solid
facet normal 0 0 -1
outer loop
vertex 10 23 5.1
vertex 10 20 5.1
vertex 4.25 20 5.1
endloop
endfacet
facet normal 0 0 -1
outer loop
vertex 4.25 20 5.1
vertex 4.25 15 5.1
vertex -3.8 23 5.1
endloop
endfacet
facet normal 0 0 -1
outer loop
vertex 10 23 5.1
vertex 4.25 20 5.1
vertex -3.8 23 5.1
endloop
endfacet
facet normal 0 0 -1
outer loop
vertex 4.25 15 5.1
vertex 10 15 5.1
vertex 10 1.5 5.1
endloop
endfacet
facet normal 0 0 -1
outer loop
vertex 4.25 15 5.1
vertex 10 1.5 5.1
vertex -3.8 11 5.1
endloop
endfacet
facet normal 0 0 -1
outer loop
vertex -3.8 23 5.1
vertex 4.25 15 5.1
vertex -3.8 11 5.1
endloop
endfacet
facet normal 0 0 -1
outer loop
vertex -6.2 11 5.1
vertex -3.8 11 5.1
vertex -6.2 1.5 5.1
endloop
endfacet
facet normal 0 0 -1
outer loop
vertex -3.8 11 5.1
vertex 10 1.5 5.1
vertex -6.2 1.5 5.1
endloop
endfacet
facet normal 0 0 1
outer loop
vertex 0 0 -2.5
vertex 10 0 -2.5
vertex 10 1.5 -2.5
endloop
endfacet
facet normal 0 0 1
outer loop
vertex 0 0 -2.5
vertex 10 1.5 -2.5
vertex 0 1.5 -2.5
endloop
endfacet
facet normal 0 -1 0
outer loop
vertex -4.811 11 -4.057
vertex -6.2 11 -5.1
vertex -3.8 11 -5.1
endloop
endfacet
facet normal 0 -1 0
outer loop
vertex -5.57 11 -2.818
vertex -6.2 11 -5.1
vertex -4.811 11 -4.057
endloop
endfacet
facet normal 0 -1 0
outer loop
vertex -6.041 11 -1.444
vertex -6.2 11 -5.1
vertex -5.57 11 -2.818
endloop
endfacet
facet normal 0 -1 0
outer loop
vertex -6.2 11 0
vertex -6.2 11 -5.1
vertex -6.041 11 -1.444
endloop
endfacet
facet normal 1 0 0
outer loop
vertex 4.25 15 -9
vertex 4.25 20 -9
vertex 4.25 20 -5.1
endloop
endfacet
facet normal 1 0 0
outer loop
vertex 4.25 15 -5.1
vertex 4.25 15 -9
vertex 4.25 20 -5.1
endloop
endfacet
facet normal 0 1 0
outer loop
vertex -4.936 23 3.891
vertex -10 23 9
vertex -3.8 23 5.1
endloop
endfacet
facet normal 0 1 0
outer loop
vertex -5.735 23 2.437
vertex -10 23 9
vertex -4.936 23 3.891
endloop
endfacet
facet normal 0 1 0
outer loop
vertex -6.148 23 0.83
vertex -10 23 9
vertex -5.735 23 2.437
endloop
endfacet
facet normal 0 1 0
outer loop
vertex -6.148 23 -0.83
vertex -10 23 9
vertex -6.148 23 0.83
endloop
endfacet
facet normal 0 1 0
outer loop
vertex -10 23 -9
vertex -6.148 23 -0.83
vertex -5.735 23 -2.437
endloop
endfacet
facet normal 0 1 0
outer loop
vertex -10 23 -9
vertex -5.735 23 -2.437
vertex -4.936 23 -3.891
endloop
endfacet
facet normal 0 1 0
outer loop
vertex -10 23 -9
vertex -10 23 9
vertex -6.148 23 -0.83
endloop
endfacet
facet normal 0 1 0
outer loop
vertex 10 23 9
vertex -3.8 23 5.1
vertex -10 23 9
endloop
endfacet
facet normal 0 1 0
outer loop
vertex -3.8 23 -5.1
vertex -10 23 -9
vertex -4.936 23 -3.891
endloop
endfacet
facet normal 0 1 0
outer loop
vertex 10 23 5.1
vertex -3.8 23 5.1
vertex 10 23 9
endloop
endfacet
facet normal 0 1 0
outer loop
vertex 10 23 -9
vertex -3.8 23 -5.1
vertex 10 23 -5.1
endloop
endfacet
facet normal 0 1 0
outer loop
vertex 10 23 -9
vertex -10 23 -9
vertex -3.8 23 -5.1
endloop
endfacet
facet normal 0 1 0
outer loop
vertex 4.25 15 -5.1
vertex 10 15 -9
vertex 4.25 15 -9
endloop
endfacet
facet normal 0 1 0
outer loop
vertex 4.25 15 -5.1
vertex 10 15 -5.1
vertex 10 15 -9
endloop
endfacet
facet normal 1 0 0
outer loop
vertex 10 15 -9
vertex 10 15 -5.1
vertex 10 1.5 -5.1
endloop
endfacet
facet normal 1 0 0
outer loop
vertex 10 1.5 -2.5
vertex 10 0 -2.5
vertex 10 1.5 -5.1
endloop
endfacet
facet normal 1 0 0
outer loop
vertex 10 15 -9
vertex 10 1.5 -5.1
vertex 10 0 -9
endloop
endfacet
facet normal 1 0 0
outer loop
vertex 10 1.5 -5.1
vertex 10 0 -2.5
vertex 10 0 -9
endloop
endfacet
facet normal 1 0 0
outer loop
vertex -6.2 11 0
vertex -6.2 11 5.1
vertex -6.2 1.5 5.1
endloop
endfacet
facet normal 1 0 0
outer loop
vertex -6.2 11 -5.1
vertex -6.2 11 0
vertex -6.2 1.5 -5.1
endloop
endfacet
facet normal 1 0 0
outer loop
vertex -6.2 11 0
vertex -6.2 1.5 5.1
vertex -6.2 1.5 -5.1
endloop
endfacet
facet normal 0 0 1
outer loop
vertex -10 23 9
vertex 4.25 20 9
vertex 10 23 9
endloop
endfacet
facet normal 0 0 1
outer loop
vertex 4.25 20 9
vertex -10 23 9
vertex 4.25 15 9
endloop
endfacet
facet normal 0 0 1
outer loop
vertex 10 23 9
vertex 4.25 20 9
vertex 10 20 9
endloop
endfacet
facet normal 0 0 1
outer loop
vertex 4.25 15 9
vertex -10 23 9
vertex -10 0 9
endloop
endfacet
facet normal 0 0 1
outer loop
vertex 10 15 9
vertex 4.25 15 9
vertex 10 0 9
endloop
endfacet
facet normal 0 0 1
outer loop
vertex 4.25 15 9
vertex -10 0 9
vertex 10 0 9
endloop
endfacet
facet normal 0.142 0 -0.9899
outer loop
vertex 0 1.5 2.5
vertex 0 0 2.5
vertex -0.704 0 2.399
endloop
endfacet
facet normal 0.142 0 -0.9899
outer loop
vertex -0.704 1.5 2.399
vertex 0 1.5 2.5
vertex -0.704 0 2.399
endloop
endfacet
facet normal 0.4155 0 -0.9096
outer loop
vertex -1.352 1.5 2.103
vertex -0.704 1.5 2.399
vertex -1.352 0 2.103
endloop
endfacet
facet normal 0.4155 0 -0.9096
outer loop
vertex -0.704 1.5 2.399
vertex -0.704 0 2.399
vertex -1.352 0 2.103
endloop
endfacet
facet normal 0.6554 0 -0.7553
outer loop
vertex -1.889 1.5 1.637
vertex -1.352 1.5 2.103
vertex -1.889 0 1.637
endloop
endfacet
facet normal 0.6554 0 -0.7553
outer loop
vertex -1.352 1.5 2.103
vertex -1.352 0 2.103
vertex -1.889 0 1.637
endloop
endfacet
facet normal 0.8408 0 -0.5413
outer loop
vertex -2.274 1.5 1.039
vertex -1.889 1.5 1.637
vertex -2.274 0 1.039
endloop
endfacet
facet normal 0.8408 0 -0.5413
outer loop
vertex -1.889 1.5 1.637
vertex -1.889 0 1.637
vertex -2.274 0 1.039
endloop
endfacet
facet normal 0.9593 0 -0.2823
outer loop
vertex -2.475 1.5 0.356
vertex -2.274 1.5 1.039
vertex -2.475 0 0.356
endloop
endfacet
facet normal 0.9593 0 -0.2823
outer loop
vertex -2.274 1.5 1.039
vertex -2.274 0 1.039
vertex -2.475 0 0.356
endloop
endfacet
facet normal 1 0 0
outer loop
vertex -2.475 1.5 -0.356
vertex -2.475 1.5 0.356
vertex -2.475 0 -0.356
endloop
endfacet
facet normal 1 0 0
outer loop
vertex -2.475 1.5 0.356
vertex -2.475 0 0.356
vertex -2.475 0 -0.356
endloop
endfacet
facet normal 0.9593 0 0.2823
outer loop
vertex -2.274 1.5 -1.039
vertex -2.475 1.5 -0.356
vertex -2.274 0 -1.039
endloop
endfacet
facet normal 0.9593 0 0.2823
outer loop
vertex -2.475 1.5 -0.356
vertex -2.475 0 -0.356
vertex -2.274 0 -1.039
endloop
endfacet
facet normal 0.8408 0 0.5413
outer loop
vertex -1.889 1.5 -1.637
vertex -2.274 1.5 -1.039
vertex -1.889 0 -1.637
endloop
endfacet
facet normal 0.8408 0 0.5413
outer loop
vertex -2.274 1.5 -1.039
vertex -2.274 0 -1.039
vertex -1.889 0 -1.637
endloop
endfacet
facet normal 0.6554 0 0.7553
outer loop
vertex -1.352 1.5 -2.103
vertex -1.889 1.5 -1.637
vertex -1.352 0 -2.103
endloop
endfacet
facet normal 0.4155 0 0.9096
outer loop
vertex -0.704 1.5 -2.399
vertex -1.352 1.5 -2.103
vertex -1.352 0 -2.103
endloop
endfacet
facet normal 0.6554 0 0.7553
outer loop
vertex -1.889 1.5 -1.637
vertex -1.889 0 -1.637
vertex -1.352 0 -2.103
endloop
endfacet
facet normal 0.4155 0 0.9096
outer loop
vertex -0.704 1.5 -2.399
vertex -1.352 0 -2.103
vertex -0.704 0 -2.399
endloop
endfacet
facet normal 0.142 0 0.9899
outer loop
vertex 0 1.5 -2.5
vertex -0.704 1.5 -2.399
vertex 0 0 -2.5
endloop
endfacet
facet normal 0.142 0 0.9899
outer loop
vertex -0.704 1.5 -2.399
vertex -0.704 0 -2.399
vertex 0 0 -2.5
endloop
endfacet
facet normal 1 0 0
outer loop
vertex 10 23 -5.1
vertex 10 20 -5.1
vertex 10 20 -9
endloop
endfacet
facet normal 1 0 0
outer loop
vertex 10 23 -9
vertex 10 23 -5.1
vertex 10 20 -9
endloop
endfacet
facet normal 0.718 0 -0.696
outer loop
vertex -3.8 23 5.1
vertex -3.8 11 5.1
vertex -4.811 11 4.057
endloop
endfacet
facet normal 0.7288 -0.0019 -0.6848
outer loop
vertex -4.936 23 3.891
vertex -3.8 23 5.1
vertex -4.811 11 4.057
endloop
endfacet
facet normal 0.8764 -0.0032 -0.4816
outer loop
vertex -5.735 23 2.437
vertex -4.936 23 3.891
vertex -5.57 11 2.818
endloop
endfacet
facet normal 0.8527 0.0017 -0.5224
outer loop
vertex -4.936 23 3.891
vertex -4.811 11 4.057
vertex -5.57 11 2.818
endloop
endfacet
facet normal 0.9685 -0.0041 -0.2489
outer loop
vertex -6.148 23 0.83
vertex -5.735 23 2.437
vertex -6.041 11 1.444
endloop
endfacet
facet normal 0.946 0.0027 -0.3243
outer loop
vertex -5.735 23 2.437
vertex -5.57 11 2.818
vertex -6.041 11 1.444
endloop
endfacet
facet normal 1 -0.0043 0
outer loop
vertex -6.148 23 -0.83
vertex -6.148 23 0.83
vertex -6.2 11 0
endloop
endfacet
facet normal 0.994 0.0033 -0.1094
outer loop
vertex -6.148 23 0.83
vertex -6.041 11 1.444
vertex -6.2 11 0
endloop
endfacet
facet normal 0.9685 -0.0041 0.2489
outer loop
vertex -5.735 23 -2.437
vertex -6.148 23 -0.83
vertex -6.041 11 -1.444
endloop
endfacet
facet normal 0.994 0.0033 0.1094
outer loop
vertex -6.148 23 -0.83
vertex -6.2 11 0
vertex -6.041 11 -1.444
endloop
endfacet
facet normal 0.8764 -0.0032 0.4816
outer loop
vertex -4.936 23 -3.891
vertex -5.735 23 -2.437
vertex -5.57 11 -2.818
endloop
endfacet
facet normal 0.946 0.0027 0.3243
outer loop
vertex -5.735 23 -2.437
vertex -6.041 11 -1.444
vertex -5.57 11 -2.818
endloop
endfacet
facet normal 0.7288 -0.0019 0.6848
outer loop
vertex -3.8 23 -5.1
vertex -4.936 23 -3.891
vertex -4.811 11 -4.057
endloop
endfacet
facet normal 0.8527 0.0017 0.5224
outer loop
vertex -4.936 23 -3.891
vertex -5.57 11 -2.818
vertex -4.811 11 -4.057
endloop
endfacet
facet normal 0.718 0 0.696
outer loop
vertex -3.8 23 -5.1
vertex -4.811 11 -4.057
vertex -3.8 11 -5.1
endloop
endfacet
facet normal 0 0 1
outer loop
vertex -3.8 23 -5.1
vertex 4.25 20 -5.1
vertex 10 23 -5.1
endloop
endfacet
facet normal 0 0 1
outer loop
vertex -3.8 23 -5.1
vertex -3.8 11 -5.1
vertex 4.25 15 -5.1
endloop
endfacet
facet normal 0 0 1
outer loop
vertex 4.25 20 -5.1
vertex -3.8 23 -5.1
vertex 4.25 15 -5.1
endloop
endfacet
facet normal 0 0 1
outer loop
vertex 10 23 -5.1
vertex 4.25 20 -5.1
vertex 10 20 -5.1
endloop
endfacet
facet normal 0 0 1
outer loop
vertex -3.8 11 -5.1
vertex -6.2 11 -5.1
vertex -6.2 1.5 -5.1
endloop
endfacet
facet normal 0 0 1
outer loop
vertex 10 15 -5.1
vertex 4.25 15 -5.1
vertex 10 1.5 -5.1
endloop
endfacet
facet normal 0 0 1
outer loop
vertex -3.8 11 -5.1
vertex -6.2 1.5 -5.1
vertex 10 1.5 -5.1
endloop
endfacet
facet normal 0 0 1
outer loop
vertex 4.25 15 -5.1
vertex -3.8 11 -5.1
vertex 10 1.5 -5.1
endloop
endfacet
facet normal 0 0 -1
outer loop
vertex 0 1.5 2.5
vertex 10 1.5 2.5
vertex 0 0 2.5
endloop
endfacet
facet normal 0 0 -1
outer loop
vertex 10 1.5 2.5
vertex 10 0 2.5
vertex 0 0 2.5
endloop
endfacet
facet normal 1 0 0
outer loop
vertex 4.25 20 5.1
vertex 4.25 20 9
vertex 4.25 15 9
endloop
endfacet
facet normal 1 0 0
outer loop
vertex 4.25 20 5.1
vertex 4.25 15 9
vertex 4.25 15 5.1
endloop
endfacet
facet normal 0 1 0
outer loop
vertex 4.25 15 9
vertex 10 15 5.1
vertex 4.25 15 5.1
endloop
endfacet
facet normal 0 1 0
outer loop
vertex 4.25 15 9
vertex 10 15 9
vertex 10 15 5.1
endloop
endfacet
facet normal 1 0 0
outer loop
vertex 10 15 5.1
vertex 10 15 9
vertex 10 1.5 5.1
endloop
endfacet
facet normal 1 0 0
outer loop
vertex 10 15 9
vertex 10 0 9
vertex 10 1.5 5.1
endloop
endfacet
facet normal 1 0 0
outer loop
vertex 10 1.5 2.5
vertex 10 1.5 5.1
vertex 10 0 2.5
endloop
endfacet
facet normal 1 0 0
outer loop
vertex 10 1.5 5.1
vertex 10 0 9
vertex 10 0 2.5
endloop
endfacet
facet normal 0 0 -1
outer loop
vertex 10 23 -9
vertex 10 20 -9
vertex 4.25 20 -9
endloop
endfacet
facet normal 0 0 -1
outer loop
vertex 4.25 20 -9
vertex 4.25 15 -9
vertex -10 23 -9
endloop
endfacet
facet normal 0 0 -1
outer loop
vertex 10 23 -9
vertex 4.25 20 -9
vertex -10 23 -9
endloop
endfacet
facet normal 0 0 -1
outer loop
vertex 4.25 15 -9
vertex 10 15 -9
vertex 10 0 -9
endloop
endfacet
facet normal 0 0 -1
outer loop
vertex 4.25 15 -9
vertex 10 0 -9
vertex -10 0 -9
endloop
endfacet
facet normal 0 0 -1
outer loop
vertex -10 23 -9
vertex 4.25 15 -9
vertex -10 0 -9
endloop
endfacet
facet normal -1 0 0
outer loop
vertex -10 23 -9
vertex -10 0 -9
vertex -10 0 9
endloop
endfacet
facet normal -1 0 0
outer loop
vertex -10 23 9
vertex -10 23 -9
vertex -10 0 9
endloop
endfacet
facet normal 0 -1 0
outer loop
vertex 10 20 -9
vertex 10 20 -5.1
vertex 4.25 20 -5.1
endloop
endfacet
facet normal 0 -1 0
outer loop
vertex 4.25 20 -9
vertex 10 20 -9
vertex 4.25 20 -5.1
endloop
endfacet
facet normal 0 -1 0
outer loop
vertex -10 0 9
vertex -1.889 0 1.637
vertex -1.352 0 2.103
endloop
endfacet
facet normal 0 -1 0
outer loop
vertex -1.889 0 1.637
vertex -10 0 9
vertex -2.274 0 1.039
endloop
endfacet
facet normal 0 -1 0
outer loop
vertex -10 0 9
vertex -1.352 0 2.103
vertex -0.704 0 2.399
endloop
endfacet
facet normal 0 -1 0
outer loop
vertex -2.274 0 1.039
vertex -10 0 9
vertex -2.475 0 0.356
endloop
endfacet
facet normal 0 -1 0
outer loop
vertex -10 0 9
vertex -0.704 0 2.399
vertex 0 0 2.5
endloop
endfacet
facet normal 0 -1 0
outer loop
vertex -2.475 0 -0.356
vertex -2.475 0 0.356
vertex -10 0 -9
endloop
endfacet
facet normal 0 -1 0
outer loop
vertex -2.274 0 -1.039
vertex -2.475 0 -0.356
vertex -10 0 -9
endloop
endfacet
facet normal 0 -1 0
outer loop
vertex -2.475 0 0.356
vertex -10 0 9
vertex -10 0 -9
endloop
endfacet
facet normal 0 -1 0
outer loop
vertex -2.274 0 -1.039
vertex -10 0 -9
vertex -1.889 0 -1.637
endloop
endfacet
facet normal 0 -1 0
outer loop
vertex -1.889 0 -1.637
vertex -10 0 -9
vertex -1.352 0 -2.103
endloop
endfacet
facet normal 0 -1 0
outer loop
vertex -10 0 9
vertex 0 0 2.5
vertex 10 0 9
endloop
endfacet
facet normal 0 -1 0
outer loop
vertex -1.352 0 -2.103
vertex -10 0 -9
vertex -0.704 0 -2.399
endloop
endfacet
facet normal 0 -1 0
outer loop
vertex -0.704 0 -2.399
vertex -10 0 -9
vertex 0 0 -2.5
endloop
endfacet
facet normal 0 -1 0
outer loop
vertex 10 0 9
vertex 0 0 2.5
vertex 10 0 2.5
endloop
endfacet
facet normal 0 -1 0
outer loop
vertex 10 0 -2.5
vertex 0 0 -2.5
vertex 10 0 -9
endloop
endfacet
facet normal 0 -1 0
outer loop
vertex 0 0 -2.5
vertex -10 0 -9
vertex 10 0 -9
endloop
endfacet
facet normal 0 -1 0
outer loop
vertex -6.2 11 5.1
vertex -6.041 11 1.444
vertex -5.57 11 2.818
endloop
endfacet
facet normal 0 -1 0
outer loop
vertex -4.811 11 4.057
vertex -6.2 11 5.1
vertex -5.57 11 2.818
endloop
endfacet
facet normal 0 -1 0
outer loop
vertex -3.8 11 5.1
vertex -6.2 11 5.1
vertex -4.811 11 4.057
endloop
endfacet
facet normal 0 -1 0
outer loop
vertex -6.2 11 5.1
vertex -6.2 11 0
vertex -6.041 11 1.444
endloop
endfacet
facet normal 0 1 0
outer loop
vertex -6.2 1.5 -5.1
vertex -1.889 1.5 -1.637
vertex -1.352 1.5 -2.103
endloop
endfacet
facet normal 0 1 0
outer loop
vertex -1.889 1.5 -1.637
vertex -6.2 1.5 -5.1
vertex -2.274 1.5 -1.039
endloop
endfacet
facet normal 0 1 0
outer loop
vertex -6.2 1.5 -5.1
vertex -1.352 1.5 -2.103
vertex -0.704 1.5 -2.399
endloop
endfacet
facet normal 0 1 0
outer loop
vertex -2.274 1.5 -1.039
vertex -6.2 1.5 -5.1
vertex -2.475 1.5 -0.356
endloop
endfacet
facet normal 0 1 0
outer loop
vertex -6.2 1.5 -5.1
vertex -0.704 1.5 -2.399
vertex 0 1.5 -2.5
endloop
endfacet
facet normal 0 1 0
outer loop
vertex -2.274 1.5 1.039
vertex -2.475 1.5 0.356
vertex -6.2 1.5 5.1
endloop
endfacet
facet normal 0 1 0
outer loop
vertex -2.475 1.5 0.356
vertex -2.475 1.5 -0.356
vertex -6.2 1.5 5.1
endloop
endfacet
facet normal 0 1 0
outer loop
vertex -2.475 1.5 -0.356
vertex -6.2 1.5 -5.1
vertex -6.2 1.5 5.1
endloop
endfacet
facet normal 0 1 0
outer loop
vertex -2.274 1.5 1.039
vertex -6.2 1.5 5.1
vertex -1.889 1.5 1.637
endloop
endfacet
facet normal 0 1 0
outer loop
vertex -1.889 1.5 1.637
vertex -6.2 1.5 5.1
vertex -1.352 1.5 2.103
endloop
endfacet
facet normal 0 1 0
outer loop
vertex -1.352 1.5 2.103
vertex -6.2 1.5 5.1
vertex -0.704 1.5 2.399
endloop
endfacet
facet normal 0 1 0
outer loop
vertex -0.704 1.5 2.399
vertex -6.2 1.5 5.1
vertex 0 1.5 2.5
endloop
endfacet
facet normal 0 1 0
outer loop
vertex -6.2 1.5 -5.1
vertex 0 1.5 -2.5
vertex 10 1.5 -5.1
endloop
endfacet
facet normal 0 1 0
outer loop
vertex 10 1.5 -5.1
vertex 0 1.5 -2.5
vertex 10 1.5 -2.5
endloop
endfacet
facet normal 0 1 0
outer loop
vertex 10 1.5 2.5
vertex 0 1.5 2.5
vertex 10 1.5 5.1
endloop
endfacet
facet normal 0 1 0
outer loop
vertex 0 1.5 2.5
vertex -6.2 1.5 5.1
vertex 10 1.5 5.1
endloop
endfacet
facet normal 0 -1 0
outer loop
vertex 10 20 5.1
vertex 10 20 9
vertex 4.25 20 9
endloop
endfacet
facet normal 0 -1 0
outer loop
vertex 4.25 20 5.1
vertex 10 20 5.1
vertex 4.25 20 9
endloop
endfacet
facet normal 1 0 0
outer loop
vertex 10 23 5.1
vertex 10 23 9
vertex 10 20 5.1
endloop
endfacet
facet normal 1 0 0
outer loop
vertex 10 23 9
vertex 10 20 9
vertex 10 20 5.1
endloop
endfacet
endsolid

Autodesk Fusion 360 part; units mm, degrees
sketch "Sketch1" plane through (0, 0, 0) normal (0, 1, 0) x (1, 0, 0)
  line L0 (-10, -9) -> (10, -9)
  line L1 (10, -9) -> (10, 9)
  line L2 (10, 9) -> (-10, 9)
  line L3 (-10, 9) -> (-10, -9)
  line L4 (-10, 0) -> (10, 0) construction
  line L5 (0, 9) -> (0, -9) construction
  dimension "d1" = 18
  dimension "d2" = 20
extrude "Extrude1" add sketch "Sketch1" along normal blind 23
sketch "Sketch2" plane through (0, 0, 0) normal (0, -1, 0) x (1, 0, 0)
  line L0 (-10, 9) -> (-10, -9)
  line L1 (-10, -9) -> (10, -9)
  line L2 (10, -9) -> (10, 9)
  line L3 (10, 9) -> (-10, 9)
  line L4 (10, 2.5) -> (0, 2.5)
  line L5 (10, -2.5) -> (0, -2.5)
  arc A0 (0, 2.5) -> (0, -2.5) centre (0, 0) ccw
  line L6 (10, 2.5) -> (10, -2.5)
  dimension "d5" = 2.5
extrude "Extrude2" cut sketch "Sketch2" against normal blind 1.5 contours L2 L4 L5 A0 L6
sketch "Sketch3" plane through (0, 1.5, 0) normal (0, -1, 0) x (1, 0, 0)
  arc A0 (0, 2.5) -> (0, -2.5) centre (0, 0) ccw
  line L0 (0, -2.5) -> (10, -2.5)
  line L1 (10, -2.5) -> (10, 2.5)
  line L2 (10, 2.5) -> (0, 2.5)
  line L3 (10, 5.1) -> (-6.2, 5.1)
  line L4 (-6.2, 5.1) -> (-6.2, -5.1)
  line L5 (-6.2, -5.1) -> (10, -5.1)
  line L6 (10, -5.1) -> (10, 5.1)
  line L7 (-6.2, 0) -> (10, 0) construction
  dimension "d9" = 10.2
  dimension "d10" = 6.2
extrude "Extrude3" cut sketch "Sketch3" against normal blind 9.5
sketch "Sketch4" plane through (0, 11, 0) normal (0, -1, 0) x (1, 0, 0)
  line L0 (10, -5.1) -> (10, 5.1)
  line L1 (10, 5.1) -> (-6.2, 5.1)
  line L2 (-6.2, 5.1) -> (-6.2, -5.1)
  line L3 (-6.2, -5.1) -> (10, -5.1)
  arc A0 (-3.8, 5.1) -> (-3.8, -5.1) centre (0.4187, 0) ccw
  line L4 (-3.8, 5.1) -> (10, 5.1)
  line L5 (10, -5.1) -> (-3.8, -5.1)
  dimension "d13" = 2.4
extrude "Extrude4" cut sketch "Sketch4" against normal through all contours L0 L1 L3 A0 L4 L5
sketch "Sketch6" plane through (0, 23, 0) normal (0, 1, 0) x (-1, 0, 0)
  line L0 (3.8, -5.1) -> (-10, -5.1)
  line L1 (-10, -5.1) -> (-10, -9)
  line L2 (-10, -9) -> (10, -9)
  line L3 (10, -9) -> (10, 9)
  line L4 (10, 9) -> (-10, 9)
  line L5 (-10, 9) -> (-10, 5.1)
  line L6 (-10, 5.1) -> (3.8, 5.1)
  arc A0 (3.8, -5.1) -> (3.8, 5.1) centre (-0.4187, 0) ccw
  line L7 (-10, 9) -> (-4.25, 9)
  line L8 (-4.25, 9) -> (-4.25, 5.1)
  line L9 (-4.25, 5.1) -> (-10, 5.1)
  line L10 (-10, 5.1) -> (-10, 9)
  line L11 (-2.5, 0) -> (-20, 0)
  line L12 (-4.25, -9) -> (-4.25, -5.1)
  line L13 (-10, -9) -> (-4.25, -9)
  line L14 (-10, -5.1) -> (-10, -9)
  line L15 (-4.25, -5.1) -> (-10, -5.1)
  dimension "d17" = 5.75
extrude "Extrude5" cut sketch "Sketch6" against normal blind 5 from surface at -3 contours L0 L1 L2 L12 L13 L14 L15 | L4 L5 L6 L7 L8 L9 L10
